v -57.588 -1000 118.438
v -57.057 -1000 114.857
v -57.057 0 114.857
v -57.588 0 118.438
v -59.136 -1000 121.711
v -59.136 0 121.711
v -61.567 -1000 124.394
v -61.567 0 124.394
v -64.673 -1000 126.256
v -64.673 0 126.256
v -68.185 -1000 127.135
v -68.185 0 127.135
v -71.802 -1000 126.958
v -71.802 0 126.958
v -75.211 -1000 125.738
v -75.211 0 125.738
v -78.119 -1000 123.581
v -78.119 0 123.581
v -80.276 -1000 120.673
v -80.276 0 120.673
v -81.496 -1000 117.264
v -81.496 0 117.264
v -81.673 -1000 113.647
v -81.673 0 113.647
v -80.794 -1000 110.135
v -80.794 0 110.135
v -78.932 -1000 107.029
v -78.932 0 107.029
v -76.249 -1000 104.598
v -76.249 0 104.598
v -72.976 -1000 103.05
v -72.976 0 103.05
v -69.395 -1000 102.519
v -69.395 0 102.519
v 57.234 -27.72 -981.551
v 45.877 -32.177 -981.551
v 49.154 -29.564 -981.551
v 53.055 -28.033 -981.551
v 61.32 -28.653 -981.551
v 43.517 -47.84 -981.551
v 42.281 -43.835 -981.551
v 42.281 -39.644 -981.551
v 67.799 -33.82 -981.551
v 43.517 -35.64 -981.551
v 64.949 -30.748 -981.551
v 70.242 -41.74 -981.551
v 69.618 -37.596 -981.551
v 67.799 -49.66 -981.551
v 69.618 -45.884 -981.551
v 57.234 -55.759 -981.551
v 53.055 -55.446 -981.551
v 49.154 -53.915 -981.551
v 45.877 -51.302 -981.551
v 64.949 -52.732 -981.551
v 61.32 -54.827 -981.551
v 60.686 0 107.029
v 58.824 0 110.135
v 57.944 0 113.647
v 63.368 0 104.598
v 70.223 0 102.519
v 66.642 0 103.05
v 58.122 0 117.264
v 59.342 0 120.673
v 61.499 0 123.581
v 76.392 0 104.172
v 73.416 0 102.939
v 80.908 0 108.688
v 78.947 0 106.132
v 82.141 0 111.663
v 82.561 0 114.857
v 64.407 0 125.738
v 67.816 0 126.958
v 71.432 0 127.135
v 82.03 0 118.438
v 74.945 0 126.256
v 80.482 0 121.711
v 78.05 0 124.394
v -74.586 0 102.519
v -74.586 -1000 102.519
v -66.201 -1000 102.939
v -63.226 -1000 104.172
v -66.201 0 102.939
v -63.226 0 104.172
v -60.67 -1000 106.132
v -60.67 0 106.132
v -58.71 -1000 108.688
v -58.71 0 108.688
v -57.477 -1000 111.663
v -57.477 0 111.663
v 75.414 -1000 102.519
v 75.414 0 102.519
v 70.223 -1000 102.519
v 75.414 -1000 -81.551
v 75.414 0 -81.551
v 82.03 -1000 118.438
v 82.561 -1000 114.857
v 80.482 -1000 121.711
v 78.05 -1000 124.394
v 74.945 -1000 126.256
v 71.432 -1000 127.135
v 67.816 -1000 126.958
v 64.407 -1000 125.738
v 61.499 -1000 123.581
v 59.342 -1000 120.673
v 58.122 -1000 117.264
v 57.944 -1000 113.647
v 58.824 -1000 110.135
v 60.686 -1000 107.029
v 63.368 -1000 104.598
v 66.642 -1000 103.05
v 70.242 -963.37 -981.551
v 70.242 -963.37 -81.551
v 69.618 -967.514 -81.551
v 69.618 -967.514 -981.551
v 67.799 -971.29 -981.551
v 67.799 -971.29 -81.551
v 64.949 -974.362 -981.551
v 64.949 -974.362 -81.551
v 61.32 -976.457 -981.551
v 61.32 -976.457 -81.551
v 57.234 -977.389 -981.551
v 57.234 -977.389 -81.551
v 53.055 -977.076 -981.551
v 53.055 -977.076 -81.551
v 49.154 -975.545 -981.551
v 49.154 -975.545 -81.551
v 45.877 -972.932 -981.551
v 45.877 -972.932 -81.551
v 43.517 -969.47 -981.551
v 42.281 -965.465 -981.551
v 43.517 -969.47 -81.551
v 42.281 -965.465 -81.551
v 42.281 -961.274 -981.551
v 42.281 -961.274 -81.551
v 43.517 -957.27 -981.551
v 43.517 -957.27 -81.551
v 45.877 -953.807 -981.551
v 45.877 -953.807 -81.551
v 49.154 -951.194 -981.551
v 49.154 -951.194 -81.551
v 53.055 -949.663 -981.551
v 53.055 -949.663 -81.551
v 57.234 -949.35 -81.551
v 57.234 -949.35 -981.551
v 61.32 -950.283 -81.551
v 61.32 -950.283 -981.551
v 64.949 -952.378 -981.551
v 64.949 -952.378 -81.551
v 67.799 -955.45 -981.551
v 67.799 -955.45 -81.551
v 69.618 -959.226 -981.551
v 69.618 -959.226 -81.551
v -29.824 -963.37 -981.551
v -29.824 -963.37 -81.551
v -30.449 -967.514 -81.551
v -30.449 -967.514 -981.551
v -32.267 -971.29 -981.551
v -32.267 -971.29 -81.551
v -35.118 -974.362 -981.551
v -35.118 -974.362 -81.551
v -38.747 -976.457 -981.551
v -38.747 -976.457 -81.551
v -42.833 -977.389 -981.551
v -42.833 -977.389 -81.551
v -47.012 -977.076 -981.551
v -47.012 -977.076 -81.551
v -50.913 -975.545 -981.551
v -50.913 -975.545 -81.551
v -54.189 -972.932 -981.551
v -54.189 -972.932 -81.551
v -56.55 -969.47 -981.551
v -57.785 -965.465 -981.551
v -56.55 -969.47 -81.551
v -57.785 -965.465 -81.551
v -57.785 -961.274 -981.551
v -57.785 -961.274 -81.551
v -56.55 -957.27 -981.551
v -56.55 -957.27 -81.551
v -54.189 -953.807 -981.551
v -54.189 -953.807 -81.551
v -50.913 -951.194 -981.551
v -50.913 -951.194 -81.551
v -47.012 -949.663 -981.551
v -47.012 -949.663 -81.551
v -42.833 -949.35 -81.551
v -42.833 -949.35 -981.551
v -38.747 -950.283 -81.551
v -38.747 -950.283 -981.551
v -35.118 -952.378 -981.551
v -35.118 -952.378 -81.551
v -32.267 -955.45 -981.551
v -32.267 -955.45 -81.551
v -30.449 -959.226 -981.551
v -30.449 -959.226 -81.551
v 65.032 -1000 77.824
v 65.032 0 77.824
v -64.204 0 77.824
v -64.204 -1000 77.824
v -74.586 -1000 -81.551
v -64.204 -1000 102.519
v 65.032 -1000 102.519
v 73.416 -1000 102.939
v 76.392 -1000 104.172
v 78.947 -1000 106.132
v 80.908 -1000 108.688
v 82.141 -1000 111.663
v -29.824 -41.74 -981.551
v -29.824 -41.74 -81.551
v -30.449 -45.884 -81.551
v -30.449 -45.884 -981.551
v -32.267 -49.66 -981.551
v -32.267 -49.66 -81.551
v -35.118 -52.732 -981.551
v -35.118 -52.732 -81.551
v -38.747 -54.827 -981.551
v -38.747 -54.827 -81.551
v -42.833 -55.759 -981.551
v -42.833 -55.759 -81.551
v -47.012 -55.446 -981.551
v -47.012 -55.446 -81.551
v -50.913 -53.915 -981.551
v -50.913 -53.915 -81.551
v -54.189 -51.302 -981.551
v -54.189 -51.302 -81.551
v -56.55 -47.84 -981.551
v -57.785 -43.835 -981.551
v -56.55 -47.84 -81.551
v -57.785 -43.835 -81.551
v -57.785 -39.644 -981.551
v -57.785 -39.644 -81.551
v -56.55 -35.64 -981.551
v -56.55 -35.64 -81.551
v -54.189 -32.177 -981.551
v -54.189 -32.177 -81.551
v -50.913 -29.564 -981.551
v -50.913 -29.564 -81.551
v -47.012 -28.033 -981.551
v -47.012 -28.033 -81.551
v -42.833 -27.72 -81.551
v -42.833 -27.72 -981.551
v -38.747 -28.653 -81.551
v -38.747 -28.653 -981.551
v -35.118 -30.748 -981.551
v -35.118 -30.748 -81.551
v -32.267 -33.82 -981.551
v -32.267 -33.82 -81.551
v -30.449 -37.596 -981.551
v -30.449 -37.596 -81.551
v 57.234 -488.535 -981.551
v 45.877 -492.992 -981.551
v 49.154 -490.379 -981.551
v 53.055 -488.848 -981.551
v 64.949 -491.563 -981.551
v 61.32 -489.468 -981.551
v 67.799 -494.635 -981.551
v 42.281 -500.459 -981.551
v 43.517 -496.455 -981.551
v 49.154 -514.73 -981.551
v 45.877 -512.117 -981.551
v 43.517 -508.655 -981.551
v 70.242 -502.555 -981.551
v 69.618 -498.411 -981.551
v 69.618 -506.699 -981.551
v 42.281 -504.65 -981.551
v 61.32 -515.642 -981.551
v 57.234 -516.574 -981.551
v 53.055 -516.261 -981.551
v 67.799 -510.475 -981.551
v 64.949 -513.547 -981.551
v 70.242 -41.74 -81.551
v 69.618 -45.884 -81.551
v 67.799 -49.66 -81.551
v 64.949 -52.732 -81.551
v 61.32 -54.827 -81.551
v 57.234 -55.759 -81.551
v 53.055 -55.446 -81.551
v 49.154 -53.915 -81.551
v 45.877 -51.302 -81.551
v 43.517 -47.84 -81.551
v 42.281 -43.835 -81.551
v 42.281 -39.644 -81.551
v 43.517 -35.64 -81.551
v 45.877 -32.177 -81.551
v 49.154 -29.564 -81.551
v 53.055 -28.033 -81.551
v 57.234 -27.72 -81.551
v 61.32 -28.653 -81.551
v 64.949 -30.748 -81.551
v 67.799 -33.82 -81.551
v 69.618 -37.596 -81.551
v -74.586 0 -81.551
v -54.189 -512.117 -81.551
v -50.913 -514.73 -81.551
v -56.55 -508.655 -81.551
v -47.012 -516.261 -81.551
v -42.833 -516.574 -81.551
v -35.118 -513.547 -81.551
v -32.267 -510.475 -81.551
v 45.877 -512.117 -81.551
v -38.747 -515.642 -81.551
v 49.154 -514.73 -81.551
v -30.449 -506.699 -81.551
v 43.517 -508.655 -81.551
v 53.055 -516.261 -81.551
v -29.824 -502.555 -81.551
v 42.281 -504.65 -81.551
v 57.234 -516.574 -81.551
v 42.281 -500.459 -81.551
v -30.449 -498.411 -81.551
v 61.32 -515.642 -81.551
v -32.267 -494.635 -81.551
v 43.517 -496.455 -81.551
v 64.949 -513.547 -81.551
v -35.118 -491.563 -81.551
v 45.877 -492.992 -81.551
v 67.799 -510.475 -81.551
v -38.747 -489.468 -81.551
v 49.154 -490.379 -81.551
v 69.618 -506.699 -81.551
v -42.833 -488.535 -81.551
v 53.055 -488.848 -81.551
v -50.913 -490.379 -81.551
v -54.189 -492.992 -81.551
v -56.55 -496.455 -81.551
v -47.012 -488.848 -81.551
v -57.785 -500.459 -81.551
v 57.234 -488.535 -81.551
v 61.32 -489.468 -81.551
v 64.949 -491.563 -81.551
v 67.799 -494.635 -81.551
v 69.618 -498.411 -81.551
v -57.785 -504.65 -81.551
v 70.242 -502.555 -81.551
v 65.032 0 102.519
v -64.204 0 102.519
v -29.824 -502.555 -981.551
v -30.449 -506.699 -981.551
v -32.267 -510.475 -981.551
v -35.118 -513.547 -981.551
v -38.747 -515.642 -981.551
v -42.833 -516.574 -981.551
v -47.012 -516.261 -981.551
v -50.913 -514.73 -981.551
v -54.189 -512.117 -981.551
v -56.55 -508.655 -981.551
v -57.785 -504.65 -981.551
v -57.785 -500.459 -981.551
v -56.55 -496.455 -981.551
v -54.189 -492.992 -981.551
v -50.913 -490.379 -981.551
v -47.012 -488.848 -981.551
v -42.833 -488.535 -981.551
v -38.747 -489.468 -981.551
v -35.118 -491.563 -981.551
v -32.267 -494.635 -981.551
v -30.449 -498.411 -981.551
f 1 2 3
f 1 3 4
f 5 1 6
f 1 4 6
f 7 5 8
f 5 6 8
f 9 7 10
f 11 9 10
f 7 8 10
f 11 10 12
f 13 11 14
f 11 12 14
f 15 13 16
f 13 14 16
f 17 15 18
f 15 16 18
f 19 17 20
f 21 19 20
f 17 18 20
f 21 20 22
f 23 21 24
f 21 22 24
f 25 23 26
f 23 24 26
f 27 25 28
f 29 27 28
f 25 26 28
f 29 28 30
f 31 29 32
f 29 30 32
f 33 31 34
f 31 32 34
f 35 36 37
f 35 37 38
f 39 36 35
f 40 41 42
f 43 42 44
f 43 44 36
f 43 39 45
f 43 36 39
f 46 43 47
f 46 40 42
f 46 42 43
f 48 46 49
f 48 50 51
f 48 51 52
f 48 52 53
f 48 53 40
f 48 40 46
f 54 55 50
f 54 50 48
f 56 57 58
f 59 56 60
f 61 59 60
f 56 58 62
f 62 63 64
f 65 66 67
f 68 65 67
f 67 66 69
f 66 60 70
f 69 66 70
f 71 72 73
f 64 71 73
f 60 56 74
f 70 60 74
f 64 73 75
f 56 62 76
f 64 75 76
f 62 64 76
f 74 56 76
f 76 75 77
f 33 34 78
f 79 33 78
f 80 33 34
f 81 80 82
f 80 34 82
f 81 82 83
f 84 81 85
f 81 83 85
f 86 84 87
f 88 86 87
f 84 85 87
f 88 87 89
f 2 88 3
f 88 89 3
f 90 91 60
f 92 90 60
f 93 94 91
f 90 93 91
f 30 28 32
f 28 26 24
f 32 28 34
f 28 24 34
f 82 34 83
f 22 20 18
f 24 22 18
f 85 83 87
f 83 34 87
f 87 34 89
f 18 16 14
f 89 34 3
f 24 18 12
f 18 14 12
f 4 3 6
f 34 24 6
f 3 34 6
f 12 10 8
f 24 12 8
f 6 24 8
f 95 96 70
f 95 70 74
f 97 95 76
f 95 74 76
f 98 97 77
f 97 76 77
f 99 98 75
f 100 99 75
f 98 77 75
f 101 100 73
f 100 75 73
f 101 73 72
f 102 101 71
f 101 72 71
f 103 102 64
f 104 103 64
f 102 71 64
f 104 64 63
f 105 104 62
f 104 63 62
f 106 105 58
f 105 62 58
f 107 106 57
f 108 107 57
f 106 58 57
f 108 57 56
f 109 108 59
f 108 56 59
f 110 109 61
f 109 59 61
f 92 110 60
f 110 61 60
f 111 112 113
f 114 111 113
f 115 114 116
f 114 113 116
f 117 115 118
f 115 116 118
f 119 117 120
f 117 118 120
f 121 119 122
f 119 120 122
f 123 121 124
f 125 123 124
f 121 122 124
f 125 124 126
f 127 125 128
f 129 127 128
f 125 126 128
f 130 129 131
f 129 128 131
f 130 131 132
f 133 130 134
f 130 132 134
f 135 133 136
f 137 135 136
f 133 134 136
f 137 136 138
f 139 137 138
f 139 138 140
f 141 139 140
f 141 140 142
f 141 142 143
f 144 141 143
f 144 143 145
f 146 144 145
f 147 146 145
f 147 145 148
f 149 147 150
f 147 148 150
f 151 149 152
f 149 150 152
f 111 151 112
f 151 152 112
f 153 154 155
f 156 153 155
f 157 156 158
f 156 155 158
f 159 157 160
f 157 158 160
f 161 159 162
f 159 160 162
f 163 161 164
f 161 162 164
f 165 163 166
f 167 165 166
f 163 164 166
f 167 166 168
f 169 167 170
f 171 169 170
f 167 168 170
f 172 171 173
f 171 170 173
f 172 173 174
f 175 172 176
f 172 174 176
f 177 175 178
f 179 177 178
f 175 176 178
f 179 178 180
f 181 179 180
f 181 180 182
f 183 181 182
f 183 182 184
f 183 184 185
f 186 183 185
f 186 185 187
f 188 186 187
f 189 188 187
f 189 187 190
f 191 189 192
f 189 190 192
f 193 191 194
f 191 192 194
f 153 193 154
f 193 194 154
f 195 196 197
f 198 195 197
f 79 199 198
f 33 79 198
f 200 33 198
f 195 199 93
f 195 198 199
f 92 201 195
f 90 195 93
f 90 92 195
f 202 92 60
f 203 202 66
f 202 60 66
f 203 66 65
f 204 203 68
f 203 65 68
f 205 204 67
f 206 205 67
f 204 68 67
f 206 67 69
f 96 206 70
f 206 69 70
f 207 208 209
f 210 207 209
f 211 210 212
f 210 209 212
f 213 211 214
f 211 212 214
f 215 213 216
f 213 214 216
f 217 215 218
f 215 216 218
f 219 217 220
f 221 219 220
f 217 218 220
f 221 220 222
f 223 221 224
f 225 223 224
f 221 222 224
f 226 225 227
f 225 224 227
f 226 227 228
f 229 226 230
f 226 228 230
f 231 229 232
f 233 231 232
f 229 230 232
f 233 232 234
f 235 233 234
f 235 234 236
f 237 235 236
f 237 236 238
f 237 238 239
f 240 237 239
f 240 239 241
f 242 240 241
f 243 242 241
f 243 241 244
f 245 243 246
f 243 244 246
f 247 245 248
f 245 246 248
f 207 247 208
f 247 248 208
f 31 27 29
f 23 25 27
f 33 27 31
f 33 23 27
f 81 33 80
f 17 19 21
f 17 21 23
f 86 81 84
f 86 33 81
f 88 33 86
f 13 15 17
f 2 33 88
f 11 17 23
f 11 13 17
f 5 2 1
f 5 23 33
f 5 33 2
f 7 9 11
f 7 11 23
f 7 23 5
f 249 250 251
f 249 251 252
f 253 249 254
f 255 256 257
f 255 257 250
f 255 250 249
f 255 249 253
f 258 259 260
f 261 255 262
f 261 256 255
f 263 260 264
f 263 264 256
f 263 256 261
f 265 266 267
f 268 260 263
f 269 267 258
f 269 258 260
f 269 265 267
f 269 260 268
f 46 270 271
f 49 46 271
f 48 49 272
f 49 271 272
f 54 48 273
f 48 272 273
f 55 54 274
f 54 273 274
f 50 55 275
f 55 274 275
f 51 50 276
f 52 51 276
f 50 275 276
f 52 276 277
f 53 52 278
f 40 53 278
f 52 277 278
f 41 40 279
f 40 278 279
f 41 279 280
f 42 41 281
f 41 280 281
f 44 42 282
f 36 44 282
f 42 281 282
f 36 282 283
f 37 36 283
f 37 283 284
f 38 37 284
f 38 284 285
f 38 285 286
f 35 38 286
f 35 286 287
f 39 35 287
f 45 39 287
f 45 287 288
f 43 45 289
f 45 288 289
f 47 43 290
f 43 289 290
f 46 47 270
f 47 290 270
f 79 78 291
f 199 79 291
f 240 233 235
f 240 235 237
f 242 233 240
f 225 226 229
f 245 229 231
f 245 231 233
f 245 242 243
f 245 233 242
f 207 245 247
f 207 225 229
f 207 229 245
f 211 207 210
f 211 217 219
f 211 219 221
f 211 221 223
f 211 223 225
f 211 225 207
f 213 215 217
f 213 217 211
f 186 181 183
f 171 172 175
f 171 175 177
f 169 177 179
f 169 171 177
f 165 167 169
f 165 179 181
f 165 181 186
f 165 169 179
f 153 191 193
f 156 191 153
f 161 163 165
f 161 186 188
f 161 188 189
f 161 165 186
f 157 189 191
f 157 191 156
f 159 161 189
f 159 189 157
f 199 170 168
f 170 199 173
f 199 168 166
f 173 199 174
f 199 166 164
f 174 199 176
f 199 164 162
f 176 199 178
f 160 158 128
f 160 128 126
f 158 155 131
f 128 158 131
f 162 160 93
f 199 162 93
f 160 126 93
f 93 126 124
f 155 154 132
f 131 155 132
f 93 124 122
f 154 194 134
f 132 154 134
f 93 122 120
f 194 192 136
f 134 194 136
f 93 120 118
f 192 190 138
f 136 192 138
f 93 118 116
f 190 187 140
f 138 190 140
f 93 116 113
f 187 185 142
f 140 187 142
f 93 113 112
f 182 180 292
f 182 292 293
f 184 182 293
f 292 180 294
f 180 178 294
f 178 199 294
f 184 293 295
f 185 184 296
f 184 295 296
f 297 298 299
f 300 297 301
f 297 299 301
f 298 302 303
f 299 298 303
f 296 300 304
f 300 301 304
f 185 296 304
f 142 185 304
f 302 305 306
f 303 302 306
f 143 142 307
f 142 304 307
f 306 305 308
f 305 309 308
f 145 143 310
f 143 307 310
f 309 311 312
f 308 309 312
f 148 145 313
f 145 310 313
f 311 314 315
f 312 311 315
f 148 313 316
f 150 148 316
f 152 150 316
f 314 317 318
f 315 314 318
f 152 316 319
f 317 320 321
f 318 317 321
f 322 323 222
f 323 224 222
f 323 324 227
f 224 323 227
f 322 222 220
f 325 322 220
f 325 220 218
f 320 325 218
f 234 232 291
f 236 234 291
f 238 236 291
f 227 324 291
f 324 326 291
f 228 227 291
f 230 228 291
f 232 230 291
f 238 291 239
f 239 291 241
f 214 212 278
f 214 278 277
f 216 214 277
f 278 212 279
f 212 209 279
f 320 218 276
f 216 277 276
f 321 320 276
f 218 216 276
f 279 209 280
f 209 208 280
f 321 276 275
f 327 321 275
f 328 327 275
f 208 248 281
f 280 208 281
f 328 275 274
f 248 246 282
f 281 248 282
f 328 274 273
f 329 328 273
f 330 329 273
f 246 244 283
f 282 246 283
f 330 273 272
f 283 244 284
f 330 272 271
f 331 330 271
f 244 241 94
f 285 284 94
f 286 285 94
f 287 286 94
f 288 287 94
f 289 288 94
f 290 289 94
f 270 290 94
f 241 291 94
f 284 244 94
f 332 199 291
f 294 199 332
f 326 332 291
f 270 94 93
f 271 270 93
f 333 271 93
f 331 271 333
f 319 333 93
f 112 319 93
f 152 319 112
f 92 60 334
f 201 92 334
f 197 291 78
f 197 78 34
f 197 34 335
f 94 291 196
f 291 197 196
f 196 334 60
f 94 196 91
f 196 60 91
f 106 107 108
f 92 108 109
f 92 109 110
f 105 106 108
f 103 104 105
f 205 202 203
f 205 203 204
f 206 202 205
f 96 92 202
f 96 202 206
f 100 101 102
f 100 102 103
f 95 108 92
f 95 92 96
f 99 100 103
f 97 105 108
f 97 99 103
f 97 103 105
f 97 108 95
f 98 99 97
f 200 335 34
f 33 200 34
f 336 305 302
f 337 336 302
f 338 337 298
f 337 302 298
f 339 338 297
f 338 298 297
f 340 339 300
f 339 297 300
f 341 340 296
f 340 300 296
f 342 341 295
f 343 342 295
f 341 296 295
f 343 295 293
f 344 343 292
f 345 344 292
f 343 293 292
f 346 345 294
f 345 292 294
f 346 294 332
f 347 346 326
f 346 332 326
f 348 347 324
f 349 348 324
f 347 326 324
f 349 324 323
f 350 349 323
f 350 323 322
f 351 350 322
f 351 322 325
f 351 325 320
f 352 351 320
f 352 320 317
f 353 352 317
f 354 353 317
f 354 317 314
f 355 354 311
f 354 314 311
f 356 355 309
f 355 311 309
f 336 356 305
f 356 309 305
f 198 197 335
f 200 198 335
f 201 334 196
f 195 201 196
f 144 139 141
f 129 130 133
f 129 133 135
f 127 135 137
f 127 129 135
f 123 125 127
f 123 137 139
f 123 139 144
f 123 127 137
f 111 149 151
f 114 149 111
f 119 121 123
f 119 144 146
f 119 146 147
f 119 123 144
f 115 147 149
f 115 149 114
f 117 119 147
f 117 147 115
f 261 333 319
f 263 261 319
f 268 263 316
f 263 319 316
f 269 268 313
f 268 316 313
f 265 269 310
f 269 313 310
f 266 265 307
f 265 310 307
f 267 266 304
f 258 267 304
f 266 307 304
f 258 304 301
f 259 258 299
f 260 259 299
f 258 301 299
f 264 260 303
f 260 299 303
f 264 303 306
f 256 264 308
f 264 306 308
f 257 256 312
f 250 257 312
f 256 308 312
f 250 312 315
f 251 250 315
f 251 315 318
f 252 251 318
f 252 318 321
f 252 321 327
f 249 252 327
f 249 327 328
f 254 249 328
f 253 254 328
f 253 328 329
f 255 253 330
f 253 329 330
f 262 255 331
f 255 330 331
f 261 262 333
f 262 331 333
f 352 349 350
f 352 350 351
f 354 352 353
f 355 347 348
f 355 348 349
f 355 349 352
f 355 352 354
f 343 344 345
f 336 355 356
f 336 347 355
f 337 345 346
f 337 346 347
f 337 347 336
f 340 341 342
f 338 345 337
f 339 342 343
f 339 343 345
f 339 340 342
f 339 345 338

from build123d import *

# Parameters (mm, degrees)
F1_DEPTH = 1000
F2_R     = 14.058959
F3_DEPTH = 900


with BuildPart() as f1:
    # F0 (on Front) → F1 (new body)
    with BuildSketch(Plane.XZ):
        Polygon((-74.585779, 102.518581), (-74.585779, 77.823524), (-64.203553, 77.823524), (-64.203553, 102.518581), (-69.394666, 102.518581), align=None)
        Polygon((-64.203553, 77.823524), (-74.585779, 77.823524), (-74.585779, -81.551469), (75.414221, -81.551469), (75.414221, 77.823524), (65.031995, 77.823524), align=None)
        with BuildLine():
            ThreePointArc((-57.056534, 114.856713), (-78.119042, 123.581089), (-69.394666, 102.518581))
            ThreePointArc((-69.394666, 102.518581), (-60.670289, 106.132336), (-57.056534, 114.856713))
        make_face()
        with BuildLine():
            ThreePointArc((82.56124, 114.856713), (61.498732, 123.581089), (70.223108, 102.518581))
            ThreePointArc((70.223108, 102.518581), (78.947485, 106.132336), (82.56124, 114.856713))
        make_face()
        Polygon((65.031995, 102.518581), (65.031995, 77.823524), (75.414221, 77.823524), (75.414221, 102.518581), (70.223108, 102.518581), align=None)
    extrude(amount=F1_DEPTH)

    # F2 (on face) → F3 (join)
    with BuildSketch(Plane(origin=(0, 0, -81.551469), x_dir=(1, 0, 0), z_dir=(0, 0, -1))):
        with Locations((56.183349, 41.739814)):
            Circle(F2_R)
        with Locations((56.183349, 502.554814)):
            Circle(F2_R)
        with Locations((56.183349, 963.369814)):
            Circle(F2_R)
        with Locations((-43.883421, 41.739814)):
            Circle(F2_R)
        with Locations((-43.883421, 502.554814)):
            Circle(F2_R)
        with Locations((-43.883421, 963.369814)):
            Circle(F2_R)
    extrude(amount=F3_DEPTH)


solid = f1.part
